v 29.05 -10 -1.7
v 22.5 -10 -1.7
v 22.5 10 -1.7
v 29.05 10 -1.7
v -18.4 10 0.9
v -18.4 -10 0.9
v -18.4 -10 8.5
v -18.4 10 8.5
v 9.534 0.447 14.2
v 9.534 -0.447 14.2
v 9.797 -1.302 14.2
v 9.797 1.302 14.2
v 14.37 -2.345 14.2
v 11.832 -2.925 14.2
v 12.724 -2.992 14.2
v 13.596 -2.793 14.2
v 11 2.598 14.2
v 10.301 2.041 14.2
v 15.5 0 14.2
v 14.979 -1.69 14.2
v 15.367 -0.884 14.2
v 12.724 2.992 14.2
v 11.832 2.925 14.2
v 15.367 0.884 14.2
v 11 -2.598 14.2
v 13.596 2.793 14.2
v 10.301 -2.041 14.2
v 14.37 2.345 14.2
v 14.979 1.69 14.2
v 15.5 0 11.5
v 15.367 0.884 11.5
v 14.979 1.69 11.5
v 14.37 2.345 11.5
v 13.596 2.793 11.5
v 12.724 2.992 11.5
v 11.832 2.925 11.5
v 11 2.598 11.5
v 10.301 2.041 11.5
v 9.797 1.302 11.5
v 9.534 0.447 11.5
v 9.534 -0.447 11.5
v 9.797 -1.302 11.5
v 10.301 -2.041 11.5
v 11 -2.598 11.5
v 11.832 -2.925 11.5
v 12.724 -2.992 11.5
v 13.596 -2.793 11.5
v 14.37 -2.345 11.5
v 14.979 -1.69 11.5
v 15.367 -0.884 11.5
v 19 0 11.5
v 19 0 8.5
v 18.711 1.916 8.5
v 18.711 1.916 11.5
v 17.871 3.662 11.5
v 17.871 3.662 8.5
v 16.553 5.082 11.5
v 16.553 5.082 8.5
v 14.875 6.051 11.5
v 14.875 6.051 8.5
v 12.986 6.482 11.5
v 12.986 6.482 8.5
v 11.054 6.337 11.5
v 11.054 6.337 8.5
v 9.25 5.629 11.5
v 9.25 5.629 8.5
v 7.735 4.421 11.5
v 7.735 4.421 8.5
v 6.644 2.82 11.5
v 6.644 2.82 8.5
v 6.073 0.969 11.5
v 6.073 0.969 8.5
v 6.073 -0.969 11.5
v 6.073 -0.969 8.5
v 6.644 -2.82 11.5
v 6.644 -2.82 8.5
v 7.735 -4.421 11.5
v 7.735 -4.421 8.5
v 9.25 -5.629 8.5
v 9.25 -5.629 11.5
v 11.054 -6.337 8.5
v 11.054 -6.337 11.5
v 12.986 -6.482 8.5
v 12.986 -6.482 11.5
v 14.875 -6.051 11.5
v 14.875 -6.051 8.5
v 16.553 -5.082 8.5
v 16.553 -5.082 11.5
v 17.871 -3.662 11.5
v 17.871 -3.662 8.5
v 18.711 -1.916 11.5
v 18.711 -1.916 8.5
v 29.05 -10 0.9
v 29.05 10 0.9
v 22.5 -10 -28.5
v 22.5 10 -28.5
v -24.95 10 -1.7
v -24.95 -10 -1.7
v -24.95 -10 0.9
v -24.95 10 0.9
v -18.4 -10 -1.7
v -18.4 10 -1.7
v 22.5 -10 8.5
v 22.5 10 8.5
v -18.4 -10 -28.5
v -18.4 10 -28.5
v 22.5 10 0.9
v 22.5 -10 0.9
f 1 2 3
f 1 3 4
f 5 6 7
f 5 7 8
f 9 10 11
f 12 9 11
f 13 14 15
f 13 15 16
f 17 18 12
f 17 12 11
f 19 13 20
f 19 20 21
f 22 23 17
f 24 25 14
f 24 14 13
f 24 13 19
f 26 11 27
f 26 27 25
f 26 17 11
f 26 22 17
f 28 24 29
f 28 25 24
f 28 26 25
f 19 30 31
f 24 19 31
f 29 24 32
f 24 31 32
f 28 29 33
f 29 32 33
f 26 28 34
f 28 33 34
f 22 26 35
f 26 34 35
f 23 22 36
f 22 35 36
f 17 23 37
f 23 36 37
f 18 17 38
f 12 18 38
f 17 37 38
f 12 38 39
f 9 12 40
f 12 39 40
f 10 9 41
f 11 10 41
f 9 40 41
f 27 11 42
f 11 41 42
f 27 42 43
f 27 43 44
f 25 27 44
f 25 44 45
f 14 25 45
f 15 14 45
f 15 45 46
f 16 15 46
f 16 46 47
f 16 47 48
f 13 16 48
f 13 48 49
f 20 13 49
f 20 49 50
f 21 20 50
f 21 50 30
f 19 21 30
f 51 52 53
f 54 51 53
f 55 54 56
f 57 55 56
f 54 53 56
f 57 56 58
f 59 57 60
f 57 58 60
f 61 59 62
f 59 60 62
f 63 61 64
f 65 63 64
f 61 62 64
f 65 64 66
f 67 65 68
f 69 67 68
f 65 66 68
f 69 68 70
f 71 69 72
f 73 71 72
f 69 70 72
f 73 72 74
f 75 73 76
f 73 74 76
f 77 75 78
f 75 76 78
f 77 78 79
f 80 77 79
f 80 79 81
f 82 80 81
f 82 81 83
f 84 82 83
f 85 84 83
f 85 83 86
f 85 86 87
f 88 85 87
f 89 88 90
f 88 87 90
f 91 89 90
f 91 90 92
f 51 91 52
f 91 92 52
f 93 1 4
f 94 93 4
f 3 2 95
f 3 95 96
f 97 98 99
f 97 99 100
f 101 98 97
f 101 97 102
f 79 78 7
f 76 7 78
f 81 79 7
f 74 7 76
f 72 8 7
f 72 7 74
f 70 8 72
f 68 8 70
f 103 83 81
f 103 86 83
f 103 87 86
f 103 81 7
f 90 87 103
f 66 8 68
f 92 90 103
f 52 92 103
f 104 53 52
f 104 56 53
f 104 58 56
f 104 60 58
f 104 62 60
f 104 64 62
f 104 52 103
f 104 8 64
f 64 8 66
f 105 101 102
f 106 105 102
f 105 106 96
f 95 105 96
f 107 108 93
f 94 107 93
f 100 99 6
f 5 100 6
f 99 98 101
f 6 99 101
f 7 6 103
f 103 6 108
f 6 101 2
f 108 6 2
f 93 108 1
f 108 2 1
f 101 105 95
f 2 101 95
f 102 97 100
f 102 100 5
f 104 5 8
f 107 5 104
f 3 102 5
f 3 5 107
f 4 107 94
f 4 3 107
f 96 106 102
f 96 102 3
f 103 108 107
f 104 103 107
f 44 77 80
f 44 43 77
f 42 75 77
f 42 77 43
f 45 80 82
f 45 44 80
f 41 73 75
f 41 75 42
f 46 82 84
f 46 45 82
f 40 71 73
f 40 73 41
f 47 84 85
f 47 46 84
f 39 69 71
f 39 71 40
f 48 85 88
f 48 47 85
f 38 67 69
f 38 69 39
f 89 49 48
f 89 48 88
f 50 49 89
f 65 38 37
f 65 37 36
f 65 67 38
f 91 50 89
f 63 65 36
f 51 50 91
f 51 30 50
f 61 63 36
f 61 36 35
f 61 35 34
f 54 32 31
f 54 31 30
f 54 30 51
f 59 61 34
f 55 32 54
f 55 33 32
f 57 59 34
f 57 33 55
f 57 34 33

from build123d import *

# Parameters (mm, degrees)
CASE_40P9_X_20_X_37_START             = -28.5
CASE_40P9_X_20_X_37_PROFILE_W         = 40.9
CASE_40P9_X_20_X_37_PROFILE_H         = 20
CASE_40P9_X_20_X_37_DEPTH             = 37
MOUNTING_TABS_54_X_20_X_2P6_START     = -1.7
MOUNTING_TABS_54_X_20_X_2P6_PROFILE_W = 54
MOUNTING_TABS_54_X_20_X_2P6_PROFILE_H = 20
MOUNTING_TABS_54_X_20_X_2P6_DEPTH     = 2.6
OUTPUT_BOSS_D13_START                 = 8.5
OUTPUT_BOSS_D13_PROFILE_R             = 6.5
OUTPUT_BOSS_D13_DEPTH                 = 3
OUTPUT_SHAFT_ENVELOPE_D6_START        = 8.5
OUTPUT_SHAFT_ENVELOPE_D6_PROFILE_R    = 3
OUTPUT_SHAFT_ENVELOPE_D6_DEPTH        = 5.7


with BuildPart() as part:
    # Case_40p9_x_20_x_37_Profile → Case_40p9_x_20_x_37 (new body)
    with BuildSketch(Plane.XY.offset(CASE_40P9_X_20_X_37_START)):
        with Locations((2.05, 0)):
            Rectangle(CASE_40P9_X_20_X_37_PROFILE_W, CASE_40P9_X_20_X_37_PROFILE_H)
    extrude(amount=CASE_40P9_X_20_X_37_DEPTH)

    # Mounting_tabs_54_x_20_x_2p6_Profile → Mounting_tabs_54_x_20_x_2p6 (add)
    with BuildSketch(Plane.XY.offset(MOUNTING_TABS_54_X_20_X_2P6_START)):
        with Locations((2.05, 0)):
            Rectangle(MOUNTING_TABS_54_X_20_X_2P6_PROFILE_W, MOUNTING_TABS_54_X_20_X_2P6_PROFILE_H)
    extrude(amount=MOUNTING_TABS_54_X_20_X_2P6_DEPTH)

    # Output_boss_D13_Profile → Output_boss_D13 (add)
    with BuildSketch(Plane.XY.offset(OUTPUT_BOSS_D13_START)):
        with Locations((12.5, 0)):
            Circle(OUTPUT_BOSS_D13_PROFILE_R)
    extrude(amount=OUTPUT_BOSS_D13_DEPTH)

    # Output_shaft_envelope_D6_Profile → Output_shaft_envelope_D6 (add)
    with BuildSketch(Plane.XY.offset(OUTPUT_SHAFT_ENVELOPE_D6_START)):
        with Locations((12.5, 0)):
            Circle(OUTPUT_SHAFT_ENVELOPE_D6_PROFILE_R)
    extrude(amount=OUTPUT_SHAFT_ENVELOPE_D6_DEPTH)


solid = part.part
